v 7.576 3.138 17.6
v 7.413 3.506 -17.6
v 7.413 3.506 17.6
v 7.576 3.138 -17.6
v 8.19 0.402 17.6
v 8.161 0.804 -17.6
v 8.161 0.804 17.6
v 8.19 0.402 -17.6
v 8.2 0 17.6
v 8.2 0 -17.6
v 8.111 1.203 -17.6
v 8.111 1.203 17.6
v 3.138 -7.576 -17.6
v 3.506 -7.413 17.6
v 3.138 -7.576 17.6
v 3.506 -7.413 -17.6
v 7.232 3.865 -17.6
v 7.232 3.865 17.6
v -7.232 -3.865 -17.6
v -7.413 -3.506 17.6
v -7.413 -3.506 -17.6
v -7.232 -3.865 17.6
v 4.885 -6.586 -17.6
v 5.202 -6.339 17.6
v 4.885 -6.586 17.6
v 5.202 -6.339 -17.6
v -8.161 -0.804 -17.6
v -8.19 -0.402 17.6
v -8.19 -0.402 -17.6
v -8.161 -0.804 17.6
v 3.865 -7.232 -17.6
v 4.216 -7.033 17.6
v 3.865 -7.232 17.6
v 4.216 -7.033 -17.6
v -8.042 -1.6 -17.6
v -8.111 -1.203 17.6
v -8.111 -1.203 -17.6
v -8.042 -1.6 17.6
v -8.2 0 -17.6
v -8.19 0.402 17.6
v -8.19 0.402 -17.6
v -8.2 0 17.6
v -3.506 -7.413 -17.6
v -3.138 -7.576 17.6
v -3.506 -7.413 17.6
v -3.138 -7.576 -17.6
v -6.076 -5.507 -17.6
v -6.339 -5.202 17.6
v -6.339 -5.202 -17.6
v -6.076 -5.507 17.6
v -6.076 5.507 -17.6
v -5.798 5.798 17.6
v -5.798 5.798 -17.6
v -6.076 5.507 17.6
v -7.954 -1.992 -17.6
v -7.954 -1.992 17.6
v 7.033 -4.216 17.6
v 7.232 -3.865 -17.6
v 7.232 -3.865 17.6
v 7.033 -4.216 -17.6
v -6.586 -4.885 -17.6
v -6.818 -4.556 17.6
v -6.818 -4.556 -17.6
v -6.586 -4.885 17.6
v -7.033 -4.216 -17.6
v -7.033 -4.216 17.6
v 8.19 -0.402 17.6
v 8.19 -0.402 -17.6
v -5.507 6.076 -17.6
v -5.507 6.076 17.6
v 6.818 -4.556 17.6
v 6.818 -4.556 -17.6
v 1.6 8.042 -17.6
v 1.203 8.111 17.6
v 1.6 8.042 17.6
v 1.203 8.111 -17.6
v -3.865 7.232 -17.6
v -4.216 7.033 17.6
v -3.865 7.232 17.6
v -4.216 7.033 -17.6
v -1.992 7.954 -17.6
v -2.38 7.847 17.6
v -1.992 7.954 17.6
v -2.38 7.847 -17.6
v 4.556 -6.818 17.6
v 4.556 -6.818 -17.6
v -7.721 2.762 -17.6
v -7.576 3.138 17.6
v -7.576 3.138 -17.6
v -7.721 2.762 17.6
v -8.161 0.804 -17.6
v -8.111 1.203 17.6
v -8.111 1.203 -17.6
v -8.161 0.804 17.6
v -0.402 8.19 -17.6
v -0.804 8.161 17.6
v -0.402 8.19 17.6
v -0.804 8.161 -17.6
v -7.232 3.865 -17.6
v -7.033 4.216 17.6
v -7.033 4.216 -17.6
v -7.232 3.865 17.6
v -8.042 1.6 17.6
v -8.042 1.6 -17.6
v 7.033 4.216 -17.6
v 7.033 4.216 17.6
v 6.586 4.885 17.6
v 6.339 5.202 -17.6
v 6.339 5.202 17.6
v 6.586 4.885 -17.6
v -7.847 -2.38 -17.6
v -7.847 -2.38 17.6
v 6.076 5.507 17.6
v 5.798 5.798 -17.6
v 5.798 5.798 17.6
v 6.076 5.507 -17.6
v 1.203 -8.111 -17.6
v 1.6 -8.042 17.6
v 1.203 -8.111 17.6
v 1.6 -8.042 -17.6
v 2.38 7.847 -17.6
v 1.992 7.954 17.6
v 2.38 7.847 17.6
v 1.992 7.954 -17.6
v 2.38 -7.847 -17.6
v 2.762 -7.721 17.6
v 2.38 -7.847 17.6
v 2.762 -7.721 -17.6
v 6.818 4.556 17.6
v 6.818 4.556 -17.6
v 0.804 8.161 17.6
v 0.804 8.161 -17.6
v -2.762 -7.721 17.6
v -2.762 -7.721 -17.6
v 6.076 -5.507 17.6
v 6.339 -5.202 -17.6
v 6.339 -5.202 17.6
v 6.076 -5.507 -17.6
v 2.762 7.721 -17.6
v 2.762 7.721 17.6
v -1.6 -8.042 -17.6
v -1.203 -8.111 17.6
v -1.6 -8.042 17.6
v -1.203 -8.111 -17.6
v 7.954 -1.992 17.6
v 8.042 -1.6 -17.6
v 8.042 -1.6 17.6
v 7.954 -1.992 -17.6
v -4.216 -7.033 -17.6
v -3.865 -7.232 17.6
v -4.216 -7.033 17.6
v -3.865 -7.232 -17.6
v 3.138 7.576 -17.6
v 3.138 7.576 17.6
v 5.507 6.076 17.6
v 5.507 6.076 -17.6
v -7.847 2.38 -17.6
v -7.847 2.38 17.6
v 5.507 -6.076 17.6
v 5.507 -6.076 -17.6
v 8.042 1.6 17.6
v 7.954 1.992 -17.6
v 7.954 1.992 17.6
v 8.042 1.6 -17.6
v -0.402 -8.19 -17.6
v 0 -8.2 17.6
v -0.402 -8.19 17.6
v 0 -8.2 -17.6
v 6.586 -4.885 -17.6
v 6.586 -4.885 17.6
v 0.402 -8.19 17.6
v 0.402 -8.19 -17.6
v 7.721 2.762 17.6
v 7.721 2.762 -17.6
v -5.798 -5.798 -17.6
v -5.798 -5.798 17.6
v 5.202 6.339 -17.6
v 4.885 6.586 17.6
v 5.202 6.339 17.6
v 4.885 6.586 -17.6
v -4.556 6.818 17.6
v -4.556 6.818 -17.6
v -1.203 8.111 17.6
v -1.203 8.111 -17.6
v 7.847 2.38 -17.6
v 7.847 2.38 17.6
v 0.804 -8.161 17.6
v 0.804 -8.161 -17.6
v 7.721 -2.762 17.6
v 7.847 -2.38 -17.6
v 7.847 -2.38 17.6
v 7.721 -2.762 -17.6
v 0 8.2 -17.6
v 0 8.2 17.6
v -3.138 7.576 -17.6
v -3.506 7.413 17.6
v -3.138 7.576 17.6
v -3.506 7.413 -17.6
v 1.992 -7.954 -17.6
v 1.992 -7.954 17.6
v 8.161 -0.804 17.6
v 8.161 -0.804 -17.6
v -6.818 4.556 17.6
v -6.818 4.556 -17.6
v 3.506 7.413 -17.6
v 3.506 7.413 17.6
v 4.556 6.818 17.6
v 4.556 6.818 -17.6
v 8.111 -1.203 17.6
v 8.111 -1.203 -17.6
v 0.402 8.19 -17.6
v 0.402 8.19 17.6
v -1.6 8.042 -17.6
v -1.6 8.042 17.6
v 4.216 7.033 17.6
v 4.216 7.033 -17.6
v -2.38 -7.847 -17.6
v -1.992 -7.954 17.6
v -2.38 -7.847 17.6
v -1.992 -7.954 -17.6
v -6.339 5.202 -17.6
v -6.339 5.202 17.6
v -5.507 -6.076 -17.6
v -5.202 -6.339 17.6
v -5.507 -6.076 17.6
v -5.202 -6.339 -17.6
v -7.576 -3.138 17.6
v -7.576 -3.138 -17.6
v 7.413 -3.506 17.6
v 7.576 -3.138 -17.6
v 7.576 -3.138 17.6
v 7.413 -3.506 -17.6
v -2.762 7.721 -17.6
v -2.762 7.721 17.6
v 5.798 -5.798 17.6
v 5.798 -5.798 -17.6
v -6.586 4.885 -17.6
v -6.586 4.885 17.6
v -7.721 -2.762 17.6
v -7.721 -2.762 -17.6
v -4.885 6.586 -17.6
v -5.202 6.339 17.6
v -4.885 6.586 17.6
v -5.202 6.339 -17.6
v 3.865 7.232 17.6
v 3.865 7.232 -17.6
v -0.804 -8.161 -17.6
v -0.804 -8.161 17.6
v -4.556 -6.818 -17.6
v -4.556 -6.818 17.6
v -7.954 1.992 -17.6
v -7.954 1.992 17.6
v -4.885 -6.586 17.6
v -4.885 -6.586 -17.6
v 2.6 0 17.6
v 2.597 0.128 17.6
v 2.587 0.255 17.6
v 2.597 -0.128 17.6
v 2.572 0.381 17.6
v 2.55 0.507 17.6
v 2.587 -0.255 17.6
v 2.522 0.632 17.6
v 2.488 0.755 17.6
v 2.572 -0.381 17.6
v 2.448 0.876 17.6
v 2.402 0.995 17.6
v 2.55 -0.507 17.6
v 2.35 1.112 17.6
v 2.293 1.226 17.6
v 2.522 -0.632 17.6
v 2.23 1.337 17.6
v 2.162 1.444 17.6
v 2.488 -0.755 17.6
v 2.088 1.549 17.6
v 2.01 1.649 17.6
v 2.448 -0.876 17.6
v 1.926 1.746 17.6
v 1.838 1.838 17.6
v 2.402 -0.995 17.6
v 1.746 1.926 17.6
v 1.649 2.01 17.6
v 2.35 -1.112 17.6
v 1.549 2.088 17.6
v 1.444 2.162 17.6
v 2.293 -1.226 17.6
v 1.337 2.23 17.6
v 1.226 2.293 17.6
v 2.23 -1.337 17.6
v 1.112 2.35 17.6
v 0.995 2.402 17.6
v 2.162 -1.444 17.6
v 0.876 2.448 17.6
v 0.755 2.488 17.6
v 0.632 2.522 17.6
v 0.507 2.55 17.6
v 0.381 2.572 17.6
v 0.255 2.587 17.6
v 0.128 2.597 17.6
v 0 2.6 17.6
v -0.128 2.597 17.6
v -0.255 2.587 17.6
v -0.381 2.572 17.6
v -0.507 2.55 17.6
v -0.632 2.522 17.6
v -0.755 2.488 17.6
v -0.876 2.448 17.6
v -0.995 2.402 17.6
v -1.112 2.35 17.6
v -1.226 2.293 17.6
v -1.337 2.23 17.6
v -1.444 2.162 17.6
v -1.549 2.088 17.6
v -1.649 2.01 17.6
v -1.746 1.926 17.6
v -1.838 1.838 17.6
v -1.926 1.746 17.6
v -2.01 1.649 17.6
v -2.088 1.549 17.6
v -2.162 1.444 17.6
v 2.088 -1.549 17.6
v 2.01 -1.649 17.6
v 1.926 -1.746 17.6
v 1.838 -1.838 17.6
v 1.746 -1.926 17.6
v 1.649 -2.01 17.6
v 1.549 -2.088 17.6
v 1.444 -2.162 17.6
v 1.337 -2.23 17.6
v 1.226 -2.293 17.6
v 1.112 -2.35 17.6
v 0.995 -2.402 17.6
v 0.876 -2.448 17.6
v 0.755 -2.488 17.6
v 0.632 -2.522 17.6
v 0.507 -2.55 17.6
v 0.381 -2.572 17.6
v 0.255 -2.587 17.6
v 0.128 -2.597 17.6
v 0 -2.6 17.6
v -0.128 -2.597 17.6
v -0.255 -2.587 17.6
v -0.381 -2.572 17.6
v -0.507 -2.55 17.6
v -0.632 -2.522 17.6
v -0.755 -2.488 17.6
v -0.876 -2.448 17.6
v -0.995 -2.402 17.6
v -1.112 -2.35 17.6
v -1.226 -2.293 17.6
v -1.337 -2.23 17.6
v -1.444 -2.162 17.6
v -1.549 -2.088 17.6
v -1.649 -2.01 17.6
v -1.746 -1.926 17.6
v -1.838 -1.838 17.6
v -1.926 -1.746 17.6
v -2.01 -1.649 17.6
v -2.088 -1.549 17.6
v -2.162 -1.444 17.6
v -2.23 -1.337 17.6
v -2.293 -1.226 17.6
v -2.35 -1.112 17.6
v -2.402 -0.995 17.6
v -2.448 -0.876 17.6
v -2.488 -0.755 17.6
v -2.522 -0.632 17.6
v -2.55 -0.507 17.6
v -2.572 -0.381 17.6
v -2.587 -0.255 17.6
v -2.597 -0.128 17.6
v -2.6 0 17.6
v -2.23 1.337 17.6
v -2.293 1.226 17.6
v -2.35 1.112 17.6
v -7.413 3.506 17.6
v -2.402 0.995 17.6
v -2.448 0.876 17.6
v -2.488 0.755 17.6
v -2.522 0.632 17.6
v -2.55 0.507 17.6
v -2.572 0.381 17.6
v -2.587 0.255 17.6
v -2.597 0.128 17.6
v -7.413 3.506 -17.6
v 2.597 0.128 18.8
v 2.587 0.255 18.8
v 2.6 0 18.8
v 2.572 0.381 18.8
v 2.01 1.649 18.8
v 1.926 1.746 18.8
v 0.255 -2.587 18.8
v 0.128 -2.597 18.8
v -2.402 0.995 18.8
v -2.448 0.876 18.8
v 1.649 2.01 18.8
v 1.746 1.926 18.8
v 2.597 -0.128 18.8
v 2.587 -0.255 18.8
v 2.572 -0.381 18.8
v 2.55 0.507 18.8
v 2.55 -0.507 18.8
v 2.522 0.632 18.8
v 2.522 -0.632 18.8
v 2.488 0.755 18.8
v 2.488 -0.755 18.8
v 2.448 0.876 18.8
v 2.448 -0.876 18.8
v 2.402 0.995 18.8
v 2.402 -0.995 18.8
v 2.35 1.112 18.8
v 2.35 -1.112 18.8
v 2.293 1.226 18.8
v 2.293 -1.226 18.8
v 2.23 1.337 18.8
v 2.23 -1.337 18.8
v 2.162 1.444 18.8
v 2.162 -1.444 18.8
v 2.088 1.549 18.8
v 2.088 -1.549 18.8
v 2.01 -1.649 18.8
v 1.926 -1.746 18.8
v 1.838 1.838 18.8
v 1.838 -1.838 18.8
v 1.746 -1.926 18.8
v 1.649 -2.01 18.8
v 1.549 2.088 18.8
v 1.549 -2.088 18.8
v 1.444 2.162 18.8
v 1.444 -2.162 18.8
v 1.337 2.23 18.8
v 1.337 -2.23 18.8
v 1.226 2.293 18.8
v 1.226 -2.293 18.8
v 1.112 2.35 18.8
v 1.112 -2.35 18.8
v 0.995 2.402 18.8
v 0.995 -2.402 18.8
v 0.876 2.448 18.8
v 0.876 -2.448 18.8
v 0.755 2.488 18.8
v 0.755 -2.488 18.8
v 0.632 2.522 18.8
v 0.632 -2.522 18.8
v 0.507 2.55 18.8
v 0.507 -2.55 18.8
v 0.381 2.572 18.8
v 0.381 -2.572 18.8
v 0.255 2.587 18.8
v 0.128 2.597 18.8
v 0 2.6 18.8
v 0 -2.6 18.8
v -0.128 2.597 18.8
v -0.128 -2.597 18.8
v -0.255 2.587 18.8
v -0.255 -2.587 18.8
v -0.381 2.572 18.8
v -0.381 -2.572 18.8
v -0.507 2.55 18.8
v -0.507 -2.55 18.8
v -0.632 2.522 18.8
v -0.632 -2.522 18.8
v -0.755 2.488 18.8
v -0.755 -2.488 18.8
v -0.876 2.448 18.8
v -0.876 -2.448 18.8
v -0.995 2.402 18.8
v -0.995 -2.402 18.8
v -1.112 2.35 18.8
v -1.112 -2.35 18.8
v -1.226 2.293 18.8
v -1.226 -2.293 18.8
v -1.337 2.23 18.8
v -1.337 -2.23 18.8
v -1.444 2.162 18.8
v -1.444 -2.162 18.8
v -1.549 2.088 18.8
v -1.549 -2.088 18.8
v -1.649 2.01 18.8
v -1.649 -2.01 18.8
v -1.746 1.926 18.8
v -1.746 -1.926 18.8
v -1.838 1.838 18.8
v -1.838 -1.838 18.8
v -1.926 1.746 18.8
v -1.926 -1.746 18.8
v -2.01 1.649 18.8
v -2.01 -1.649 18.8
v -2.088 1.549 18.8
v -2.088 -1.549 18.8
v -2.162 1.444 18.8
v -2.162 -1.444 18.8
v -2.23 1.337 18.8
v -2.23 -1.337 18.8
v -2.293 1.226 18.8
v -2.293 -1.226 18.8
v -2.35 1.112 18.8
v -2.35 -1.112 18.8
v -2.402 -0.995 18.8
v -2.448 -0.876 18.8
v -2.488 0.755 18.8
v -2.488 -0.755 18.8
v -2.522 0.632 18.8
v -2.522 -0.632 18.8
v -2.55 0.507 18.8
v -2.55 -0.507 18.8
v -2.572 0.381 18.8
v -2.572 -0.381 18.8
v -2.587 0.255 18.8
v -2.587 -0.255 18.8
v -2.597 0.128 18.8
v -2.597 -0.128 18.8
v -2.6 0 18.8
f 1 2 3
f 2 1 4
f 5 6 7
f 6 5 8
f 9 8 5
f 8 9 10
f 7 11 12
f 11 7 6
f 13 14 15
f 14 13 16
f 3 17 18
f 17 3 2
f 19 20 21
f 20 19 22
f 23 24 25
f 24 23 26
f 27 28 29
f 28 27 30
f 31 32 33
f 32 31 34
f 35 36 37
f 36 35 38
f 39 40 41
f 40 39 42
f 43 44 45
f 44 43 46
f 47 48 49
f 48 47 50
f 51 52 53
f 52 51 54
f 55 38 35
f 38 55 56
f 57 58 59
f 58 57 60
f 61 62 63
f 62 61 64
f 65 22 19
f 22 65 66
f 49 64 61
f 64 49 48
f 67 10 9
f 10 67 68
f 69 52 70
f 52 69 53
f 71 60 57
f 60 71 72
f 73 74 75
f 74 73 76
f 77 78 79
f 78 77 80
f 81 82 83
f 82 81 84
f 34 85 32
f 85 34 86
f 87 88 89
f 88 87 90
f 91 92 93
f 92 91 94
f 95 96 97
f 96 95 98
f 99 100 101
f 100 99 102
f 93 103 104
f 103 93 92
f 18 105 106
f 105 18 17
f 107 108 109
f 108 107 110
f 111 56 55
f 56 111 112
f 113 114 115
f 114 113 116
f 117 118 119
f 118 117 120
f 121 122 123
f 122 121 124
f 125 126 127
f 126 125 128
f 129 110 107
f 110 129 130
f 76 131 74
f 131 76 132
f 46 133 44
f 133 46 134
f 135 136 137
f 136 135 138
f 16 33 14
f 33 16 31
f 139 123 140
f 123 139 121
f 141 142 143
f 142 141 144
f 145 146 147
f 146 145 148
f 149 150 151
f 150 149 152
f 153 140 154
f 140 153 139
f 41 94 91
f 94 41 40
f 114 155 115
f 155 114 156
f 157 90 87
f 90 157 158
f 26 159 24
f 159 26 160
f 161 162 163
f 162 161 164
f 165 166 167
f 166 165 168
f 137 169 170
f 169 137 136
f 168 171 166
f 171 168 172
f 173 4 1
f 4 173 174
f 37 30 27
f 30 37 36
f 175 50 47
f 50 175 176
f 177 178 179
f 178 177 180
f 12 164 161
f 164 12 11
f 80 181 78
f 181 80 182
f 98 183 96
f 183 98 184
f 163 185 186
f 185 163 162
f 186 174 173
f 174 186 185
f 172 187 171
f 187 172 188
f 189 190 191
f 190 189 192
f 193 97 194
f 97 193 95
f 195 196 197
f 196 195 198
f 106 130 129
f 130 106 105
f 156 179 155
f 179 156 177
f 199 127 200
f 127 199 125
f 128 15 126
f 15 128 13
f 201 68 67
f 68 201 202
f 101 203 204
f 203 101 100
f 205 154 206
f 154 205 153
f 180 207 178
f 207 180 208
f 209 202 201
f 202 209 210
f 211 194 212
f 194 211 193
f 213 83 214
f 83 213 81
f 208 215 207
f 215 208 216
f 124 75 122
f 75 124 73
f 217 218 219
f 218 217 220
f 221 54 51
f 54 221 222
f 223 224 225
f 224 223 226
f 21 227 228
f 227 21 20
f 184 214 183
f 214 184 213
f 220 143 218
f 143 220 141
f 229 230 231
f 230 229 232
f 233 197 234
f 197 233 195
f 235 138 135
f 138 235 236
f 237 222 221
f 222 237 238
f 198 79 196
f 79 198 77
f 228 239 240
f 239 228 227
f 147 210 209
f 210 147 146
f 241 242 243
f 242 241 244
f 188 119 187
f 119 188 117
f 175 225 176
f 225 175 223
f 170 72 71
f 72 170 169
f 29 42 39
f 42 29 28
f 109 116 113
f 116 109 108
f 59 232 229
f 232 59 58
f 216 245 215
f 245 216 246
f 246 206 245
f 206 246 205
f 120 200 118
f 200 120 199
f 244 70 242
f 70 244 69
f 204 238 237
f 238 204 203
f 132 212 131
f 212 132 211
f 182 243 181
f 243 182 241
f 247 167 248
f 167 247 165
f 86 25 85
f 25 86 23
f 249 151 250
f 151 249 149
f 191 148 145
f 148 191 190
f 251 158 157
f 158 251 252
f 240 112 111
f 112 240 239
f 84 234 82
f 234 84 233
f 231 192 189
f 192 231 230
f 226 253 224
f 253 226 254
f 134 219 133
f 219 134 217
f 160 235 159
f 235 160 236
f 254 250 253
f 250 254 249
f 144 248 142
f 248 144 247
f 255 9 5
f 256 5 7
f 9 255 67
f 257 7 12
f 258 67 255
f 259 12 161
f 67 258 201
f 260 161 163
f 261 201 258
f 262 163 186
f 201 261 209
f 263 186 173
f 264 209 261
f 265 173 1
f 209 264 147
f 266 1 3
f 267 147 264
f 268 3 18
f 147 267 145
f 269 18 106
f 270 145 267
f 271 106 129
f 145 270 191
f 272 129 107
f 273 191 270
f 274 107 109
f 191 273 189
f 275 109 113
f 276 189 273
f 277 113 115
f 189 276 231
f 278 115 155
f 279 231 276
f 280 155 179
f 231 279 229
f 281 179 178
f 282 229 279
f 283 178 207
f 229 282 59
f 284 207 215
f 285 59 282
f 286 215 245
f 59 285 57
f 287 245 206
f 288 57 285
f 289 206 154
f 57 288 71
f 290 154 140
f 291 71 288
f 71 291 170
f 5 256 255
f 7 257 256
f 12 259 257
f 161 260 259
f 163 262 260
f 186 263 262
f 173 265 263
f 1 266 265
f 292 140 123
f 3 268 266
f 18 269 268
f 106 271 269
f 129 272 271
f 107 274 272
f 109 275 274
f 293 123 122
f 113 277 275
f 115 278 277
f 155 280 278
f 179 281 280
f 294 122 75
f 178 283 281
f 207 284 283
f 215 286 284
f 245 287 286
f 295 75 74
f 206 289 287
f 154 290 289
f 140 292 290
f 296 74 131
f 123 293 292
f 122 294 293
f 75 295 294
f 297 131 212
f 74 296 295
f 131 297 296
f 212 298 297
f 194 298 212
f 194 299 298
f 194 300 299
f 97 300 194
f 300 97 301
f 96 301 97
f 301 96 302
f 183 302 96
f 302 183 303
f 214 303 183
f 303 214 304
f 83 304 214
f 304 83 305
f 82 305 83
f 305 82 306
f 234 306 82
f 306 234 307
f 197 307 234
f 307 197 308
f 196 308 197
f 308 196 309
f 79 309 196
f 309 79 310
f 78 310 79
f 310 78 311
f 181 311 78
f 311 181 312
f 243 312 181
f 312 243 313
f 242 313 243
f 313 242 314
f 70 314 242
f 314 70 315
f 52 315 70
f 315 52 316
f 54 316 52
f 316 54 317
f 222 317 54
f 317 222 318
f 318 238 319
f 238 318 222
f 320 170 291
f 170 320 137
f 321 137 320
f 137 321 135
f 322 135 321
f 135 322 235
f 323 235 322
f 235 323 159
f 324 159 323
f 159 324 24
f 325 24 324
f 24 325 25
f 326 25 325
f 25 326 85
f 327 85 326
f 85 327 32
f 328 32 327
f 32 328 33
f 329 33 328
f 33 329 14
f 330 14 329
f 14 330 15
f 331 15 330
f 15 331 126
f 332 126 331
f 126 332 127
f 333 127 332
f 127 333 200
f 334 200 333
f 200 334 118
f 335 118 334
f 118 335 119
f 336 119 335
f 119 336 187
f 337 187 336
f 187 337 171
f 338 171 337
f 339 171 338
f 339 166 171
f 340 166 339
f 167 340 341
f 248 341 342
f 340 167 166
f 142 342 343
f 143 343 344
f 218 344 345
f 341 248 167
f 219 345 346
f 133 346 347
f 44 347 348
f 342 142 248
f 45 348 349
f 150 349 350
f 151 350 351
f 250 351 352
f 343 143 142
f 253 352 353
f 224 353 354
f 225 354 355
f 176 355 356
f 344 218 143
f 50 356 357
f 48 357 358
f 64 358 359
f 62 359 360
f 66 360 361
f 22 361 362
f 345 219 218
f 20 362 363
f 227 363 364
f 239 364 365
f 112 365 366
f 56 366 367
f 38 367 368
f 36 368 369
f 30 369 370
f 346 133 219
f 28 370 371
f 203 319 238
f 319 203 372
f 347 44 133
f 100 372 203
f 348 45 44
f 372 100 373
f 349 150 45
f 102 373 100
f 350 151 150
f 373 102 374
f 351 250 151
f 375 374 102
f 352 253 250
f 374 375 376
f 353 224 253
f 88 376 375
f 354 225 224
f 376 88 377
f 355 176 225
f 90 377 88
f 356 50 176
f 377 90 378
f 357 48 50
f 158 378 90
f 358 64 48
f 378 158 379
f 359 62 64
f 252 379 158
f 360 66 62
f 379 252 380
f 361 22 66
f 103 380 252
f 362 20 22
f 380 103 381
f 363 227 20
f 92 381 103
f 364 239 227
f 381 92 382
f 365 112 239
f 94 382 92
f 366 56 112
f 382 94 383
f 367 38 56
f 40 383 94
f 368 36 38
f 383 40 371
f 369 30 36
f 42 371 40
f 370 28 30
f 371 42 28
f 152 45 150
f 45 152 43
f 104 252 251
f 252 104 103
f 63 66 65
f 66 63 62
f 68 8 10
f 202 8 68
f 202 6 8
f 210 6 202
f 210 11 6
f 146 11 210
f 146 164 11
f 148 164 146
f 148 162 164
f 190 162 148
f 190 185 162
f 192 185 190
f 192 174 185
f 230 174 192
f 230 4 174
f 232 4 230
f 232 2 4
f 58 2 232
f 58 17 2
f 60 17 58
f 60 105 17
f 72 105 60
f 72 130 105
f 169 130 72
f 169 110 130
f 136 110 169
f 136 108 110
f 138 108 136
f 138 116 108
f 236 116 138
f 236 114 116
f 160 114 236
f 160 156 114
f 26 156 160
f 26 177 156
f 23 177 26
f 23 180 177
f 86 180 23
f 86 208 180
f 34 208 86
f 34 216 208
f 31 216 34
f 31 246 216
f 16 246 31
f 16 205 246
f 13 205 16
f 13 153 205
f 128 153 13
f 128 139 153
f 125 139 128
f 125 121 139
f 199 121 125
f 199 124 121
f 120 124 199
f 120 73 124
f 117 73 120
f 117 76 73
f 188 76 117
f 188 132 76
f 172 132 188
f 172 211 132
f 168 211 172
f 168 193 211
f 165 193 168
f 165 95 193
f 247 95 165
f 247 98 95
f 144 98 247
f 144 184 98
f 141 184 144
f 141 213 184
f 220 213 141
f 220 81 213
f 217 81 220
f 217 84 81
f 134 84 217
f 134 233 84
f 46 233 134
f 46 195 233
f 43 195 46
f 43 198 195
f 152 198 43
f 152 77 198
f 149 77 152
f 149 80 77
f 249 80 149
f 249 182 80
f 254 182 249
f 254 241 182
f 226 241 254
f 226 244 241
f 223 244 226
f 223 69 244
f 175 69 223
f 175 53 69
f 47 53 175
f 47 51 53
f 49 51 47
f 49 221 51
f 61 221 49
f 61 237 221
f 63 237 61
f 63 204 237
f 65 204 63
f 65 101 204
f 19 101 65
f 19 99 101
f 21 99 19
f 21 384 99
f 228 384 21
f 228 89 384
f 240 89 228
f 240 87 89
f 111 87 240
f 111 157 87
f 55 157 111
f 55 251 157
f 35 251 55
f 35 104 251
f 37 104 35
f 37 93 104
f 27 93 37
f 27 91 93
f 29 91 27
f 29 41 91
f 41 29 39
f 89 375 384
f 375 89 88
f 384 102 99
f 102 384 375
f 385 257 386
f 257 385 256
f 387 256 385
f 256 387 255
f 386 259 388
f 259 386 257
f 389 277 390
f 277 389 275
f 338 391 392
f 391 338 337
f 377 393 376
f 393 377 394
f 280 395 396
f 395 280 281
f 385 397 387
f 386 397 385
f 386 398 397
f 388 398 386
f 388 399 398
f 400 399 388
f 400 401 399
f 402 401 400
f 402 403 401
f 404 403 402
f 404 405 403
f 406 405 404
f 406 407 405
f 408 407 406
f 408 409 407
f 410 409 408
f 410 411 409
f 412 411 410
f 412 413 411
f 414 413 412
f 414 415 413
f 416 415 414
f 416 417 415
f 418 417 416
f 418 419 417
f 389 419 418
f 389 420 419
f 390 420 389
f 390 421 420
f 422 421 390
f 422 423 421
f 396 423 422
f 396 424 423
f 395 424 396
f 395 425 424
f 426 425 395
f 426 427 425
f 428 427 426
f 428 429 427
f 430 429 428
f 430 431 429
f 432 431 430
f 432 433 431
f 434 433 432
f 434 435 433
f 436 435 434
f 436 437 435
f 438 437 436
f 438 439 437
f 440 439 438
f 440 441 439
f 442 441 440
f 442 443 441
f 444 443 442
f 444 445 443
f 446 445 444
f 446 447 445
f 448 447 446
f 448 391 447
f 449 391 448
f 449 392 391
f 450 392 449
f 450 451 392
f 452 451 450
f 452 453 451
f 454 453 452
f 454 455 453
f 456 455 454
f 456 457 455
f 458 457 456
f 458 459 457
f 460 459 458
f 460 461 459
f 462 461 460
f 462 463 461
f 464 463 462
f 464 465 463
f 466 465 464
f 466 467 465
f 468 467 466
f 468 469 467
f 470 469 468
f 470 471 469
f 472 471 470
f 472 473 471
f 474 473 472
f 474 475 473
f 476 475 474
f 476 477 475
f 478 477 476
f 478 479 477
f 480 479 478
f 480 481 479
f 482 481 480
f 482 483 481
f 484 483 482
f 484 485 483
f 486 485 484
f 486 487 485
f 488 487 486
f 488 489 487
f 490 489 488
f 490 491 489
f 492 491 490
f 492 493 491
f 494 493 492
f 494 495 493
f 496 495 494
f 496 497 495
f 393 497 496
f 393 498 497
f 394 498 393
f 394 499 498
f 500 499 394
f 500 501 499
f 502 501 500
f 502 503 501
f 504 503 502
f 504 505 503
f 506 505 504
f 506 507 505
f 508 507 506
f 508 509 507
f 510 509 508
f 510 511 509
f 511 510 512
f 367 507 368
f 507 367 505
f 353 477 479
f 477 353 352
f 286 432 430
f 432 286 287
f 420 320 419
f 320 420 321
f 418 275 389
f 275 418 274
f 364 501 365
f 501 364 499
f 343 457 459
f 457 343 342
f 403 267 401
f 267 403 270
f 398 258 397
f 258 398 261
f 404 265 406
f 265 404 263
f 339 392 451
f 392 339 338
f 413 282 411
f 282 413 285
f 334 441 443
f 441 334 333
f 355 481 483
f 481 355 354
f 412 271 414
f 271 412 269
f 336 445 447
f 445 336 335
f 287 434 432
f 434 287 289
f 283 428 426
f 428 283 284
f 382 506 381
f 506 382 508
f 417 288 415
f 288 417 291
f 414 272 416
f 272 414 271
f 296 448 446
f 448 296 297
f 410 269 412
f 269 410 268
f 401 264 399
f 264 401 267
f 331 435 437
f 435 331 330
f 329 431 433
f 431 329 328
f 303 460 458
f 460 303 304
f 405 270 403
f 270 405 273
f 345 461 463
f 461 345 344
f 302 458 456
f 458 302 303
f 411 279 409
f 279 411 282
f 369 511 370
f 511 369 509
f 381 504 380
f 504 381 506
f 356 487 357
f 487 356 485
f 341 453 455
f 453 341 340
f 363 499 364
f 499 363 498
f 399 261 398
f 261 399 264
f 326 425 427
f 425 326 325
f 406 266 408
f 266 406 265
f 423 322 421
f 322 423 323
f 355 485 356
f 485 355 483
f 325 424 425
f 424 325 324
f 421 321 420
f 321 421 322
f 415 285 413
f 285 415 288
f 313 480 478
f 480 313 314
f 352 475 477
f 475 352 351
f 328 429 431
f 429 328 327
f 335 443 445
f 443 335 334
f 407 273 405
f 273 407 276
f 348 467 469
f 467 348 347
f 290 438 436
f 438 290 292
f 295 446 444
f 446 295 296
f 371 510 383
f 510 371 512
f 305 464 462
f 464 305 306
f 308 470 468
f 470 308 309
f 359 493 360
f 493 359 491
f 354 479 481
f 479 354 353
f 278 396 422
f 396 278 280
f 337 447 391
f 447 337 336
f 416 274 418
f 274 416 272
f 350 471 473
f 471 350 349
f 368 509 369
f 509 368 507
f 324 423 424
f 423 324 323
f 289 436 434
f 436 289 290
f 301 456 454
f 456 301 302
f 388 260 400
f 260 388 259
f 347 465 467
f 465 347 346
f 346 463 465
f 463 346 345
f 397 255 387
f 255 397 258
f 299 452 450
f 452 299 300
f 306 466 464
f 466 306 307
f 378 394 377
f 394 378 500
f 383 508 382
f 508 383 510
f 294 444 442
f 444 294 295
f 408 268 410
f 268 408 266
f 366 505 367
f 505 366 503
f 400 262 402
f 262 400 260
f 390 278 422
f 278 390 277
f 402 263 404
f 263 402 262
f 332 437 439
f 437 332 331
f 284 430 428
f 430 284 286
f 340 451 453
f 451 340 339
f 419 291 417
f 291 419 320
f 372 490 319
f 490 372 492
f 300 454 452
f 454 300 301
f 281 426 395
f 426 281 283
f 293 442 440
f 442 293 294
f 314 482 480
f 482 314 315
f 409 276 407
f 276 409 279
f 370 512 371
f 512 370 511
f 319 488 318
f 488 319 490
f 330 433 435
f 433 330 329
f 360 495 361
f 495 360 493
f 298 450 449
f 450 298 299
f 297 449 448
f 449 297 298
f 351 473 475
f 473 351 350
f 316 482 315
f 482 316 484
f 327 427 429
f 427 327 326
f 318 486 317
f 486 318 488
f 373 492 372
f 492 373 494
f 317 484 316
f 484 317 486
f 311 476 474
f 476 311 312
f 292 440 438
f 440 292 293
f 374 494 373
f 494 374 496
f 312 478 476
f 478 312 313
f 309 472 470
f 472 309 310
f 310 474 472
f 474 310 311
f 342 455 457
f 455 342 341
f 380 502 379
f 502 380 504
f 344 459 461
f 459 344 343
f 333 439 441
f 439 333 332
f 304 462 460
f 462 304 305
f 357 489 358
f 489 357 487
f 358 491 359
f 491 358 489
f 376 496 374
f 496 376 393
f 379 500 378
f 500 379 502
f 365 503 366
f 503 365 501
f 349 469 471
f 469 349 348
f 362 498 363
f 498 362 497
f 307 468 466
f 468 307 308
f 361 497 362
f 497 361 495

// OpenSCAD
$fn=128;

cell_h = 35.2;
cell_d = 16.4;

cap_h = 1.2;
cap_d = 5.2;

module battery_cell(h=cell_h, d=cell_d, capHeight=cap_h, capDiameter=cap_d) {
    union() {
        translate([0,0,-h/2])
            cylinder(h=h, d=d);
        translate([0,0,h/2])
            cylinder(h=capHeight, d=capDiameter);
    }
}

battery_cell();
